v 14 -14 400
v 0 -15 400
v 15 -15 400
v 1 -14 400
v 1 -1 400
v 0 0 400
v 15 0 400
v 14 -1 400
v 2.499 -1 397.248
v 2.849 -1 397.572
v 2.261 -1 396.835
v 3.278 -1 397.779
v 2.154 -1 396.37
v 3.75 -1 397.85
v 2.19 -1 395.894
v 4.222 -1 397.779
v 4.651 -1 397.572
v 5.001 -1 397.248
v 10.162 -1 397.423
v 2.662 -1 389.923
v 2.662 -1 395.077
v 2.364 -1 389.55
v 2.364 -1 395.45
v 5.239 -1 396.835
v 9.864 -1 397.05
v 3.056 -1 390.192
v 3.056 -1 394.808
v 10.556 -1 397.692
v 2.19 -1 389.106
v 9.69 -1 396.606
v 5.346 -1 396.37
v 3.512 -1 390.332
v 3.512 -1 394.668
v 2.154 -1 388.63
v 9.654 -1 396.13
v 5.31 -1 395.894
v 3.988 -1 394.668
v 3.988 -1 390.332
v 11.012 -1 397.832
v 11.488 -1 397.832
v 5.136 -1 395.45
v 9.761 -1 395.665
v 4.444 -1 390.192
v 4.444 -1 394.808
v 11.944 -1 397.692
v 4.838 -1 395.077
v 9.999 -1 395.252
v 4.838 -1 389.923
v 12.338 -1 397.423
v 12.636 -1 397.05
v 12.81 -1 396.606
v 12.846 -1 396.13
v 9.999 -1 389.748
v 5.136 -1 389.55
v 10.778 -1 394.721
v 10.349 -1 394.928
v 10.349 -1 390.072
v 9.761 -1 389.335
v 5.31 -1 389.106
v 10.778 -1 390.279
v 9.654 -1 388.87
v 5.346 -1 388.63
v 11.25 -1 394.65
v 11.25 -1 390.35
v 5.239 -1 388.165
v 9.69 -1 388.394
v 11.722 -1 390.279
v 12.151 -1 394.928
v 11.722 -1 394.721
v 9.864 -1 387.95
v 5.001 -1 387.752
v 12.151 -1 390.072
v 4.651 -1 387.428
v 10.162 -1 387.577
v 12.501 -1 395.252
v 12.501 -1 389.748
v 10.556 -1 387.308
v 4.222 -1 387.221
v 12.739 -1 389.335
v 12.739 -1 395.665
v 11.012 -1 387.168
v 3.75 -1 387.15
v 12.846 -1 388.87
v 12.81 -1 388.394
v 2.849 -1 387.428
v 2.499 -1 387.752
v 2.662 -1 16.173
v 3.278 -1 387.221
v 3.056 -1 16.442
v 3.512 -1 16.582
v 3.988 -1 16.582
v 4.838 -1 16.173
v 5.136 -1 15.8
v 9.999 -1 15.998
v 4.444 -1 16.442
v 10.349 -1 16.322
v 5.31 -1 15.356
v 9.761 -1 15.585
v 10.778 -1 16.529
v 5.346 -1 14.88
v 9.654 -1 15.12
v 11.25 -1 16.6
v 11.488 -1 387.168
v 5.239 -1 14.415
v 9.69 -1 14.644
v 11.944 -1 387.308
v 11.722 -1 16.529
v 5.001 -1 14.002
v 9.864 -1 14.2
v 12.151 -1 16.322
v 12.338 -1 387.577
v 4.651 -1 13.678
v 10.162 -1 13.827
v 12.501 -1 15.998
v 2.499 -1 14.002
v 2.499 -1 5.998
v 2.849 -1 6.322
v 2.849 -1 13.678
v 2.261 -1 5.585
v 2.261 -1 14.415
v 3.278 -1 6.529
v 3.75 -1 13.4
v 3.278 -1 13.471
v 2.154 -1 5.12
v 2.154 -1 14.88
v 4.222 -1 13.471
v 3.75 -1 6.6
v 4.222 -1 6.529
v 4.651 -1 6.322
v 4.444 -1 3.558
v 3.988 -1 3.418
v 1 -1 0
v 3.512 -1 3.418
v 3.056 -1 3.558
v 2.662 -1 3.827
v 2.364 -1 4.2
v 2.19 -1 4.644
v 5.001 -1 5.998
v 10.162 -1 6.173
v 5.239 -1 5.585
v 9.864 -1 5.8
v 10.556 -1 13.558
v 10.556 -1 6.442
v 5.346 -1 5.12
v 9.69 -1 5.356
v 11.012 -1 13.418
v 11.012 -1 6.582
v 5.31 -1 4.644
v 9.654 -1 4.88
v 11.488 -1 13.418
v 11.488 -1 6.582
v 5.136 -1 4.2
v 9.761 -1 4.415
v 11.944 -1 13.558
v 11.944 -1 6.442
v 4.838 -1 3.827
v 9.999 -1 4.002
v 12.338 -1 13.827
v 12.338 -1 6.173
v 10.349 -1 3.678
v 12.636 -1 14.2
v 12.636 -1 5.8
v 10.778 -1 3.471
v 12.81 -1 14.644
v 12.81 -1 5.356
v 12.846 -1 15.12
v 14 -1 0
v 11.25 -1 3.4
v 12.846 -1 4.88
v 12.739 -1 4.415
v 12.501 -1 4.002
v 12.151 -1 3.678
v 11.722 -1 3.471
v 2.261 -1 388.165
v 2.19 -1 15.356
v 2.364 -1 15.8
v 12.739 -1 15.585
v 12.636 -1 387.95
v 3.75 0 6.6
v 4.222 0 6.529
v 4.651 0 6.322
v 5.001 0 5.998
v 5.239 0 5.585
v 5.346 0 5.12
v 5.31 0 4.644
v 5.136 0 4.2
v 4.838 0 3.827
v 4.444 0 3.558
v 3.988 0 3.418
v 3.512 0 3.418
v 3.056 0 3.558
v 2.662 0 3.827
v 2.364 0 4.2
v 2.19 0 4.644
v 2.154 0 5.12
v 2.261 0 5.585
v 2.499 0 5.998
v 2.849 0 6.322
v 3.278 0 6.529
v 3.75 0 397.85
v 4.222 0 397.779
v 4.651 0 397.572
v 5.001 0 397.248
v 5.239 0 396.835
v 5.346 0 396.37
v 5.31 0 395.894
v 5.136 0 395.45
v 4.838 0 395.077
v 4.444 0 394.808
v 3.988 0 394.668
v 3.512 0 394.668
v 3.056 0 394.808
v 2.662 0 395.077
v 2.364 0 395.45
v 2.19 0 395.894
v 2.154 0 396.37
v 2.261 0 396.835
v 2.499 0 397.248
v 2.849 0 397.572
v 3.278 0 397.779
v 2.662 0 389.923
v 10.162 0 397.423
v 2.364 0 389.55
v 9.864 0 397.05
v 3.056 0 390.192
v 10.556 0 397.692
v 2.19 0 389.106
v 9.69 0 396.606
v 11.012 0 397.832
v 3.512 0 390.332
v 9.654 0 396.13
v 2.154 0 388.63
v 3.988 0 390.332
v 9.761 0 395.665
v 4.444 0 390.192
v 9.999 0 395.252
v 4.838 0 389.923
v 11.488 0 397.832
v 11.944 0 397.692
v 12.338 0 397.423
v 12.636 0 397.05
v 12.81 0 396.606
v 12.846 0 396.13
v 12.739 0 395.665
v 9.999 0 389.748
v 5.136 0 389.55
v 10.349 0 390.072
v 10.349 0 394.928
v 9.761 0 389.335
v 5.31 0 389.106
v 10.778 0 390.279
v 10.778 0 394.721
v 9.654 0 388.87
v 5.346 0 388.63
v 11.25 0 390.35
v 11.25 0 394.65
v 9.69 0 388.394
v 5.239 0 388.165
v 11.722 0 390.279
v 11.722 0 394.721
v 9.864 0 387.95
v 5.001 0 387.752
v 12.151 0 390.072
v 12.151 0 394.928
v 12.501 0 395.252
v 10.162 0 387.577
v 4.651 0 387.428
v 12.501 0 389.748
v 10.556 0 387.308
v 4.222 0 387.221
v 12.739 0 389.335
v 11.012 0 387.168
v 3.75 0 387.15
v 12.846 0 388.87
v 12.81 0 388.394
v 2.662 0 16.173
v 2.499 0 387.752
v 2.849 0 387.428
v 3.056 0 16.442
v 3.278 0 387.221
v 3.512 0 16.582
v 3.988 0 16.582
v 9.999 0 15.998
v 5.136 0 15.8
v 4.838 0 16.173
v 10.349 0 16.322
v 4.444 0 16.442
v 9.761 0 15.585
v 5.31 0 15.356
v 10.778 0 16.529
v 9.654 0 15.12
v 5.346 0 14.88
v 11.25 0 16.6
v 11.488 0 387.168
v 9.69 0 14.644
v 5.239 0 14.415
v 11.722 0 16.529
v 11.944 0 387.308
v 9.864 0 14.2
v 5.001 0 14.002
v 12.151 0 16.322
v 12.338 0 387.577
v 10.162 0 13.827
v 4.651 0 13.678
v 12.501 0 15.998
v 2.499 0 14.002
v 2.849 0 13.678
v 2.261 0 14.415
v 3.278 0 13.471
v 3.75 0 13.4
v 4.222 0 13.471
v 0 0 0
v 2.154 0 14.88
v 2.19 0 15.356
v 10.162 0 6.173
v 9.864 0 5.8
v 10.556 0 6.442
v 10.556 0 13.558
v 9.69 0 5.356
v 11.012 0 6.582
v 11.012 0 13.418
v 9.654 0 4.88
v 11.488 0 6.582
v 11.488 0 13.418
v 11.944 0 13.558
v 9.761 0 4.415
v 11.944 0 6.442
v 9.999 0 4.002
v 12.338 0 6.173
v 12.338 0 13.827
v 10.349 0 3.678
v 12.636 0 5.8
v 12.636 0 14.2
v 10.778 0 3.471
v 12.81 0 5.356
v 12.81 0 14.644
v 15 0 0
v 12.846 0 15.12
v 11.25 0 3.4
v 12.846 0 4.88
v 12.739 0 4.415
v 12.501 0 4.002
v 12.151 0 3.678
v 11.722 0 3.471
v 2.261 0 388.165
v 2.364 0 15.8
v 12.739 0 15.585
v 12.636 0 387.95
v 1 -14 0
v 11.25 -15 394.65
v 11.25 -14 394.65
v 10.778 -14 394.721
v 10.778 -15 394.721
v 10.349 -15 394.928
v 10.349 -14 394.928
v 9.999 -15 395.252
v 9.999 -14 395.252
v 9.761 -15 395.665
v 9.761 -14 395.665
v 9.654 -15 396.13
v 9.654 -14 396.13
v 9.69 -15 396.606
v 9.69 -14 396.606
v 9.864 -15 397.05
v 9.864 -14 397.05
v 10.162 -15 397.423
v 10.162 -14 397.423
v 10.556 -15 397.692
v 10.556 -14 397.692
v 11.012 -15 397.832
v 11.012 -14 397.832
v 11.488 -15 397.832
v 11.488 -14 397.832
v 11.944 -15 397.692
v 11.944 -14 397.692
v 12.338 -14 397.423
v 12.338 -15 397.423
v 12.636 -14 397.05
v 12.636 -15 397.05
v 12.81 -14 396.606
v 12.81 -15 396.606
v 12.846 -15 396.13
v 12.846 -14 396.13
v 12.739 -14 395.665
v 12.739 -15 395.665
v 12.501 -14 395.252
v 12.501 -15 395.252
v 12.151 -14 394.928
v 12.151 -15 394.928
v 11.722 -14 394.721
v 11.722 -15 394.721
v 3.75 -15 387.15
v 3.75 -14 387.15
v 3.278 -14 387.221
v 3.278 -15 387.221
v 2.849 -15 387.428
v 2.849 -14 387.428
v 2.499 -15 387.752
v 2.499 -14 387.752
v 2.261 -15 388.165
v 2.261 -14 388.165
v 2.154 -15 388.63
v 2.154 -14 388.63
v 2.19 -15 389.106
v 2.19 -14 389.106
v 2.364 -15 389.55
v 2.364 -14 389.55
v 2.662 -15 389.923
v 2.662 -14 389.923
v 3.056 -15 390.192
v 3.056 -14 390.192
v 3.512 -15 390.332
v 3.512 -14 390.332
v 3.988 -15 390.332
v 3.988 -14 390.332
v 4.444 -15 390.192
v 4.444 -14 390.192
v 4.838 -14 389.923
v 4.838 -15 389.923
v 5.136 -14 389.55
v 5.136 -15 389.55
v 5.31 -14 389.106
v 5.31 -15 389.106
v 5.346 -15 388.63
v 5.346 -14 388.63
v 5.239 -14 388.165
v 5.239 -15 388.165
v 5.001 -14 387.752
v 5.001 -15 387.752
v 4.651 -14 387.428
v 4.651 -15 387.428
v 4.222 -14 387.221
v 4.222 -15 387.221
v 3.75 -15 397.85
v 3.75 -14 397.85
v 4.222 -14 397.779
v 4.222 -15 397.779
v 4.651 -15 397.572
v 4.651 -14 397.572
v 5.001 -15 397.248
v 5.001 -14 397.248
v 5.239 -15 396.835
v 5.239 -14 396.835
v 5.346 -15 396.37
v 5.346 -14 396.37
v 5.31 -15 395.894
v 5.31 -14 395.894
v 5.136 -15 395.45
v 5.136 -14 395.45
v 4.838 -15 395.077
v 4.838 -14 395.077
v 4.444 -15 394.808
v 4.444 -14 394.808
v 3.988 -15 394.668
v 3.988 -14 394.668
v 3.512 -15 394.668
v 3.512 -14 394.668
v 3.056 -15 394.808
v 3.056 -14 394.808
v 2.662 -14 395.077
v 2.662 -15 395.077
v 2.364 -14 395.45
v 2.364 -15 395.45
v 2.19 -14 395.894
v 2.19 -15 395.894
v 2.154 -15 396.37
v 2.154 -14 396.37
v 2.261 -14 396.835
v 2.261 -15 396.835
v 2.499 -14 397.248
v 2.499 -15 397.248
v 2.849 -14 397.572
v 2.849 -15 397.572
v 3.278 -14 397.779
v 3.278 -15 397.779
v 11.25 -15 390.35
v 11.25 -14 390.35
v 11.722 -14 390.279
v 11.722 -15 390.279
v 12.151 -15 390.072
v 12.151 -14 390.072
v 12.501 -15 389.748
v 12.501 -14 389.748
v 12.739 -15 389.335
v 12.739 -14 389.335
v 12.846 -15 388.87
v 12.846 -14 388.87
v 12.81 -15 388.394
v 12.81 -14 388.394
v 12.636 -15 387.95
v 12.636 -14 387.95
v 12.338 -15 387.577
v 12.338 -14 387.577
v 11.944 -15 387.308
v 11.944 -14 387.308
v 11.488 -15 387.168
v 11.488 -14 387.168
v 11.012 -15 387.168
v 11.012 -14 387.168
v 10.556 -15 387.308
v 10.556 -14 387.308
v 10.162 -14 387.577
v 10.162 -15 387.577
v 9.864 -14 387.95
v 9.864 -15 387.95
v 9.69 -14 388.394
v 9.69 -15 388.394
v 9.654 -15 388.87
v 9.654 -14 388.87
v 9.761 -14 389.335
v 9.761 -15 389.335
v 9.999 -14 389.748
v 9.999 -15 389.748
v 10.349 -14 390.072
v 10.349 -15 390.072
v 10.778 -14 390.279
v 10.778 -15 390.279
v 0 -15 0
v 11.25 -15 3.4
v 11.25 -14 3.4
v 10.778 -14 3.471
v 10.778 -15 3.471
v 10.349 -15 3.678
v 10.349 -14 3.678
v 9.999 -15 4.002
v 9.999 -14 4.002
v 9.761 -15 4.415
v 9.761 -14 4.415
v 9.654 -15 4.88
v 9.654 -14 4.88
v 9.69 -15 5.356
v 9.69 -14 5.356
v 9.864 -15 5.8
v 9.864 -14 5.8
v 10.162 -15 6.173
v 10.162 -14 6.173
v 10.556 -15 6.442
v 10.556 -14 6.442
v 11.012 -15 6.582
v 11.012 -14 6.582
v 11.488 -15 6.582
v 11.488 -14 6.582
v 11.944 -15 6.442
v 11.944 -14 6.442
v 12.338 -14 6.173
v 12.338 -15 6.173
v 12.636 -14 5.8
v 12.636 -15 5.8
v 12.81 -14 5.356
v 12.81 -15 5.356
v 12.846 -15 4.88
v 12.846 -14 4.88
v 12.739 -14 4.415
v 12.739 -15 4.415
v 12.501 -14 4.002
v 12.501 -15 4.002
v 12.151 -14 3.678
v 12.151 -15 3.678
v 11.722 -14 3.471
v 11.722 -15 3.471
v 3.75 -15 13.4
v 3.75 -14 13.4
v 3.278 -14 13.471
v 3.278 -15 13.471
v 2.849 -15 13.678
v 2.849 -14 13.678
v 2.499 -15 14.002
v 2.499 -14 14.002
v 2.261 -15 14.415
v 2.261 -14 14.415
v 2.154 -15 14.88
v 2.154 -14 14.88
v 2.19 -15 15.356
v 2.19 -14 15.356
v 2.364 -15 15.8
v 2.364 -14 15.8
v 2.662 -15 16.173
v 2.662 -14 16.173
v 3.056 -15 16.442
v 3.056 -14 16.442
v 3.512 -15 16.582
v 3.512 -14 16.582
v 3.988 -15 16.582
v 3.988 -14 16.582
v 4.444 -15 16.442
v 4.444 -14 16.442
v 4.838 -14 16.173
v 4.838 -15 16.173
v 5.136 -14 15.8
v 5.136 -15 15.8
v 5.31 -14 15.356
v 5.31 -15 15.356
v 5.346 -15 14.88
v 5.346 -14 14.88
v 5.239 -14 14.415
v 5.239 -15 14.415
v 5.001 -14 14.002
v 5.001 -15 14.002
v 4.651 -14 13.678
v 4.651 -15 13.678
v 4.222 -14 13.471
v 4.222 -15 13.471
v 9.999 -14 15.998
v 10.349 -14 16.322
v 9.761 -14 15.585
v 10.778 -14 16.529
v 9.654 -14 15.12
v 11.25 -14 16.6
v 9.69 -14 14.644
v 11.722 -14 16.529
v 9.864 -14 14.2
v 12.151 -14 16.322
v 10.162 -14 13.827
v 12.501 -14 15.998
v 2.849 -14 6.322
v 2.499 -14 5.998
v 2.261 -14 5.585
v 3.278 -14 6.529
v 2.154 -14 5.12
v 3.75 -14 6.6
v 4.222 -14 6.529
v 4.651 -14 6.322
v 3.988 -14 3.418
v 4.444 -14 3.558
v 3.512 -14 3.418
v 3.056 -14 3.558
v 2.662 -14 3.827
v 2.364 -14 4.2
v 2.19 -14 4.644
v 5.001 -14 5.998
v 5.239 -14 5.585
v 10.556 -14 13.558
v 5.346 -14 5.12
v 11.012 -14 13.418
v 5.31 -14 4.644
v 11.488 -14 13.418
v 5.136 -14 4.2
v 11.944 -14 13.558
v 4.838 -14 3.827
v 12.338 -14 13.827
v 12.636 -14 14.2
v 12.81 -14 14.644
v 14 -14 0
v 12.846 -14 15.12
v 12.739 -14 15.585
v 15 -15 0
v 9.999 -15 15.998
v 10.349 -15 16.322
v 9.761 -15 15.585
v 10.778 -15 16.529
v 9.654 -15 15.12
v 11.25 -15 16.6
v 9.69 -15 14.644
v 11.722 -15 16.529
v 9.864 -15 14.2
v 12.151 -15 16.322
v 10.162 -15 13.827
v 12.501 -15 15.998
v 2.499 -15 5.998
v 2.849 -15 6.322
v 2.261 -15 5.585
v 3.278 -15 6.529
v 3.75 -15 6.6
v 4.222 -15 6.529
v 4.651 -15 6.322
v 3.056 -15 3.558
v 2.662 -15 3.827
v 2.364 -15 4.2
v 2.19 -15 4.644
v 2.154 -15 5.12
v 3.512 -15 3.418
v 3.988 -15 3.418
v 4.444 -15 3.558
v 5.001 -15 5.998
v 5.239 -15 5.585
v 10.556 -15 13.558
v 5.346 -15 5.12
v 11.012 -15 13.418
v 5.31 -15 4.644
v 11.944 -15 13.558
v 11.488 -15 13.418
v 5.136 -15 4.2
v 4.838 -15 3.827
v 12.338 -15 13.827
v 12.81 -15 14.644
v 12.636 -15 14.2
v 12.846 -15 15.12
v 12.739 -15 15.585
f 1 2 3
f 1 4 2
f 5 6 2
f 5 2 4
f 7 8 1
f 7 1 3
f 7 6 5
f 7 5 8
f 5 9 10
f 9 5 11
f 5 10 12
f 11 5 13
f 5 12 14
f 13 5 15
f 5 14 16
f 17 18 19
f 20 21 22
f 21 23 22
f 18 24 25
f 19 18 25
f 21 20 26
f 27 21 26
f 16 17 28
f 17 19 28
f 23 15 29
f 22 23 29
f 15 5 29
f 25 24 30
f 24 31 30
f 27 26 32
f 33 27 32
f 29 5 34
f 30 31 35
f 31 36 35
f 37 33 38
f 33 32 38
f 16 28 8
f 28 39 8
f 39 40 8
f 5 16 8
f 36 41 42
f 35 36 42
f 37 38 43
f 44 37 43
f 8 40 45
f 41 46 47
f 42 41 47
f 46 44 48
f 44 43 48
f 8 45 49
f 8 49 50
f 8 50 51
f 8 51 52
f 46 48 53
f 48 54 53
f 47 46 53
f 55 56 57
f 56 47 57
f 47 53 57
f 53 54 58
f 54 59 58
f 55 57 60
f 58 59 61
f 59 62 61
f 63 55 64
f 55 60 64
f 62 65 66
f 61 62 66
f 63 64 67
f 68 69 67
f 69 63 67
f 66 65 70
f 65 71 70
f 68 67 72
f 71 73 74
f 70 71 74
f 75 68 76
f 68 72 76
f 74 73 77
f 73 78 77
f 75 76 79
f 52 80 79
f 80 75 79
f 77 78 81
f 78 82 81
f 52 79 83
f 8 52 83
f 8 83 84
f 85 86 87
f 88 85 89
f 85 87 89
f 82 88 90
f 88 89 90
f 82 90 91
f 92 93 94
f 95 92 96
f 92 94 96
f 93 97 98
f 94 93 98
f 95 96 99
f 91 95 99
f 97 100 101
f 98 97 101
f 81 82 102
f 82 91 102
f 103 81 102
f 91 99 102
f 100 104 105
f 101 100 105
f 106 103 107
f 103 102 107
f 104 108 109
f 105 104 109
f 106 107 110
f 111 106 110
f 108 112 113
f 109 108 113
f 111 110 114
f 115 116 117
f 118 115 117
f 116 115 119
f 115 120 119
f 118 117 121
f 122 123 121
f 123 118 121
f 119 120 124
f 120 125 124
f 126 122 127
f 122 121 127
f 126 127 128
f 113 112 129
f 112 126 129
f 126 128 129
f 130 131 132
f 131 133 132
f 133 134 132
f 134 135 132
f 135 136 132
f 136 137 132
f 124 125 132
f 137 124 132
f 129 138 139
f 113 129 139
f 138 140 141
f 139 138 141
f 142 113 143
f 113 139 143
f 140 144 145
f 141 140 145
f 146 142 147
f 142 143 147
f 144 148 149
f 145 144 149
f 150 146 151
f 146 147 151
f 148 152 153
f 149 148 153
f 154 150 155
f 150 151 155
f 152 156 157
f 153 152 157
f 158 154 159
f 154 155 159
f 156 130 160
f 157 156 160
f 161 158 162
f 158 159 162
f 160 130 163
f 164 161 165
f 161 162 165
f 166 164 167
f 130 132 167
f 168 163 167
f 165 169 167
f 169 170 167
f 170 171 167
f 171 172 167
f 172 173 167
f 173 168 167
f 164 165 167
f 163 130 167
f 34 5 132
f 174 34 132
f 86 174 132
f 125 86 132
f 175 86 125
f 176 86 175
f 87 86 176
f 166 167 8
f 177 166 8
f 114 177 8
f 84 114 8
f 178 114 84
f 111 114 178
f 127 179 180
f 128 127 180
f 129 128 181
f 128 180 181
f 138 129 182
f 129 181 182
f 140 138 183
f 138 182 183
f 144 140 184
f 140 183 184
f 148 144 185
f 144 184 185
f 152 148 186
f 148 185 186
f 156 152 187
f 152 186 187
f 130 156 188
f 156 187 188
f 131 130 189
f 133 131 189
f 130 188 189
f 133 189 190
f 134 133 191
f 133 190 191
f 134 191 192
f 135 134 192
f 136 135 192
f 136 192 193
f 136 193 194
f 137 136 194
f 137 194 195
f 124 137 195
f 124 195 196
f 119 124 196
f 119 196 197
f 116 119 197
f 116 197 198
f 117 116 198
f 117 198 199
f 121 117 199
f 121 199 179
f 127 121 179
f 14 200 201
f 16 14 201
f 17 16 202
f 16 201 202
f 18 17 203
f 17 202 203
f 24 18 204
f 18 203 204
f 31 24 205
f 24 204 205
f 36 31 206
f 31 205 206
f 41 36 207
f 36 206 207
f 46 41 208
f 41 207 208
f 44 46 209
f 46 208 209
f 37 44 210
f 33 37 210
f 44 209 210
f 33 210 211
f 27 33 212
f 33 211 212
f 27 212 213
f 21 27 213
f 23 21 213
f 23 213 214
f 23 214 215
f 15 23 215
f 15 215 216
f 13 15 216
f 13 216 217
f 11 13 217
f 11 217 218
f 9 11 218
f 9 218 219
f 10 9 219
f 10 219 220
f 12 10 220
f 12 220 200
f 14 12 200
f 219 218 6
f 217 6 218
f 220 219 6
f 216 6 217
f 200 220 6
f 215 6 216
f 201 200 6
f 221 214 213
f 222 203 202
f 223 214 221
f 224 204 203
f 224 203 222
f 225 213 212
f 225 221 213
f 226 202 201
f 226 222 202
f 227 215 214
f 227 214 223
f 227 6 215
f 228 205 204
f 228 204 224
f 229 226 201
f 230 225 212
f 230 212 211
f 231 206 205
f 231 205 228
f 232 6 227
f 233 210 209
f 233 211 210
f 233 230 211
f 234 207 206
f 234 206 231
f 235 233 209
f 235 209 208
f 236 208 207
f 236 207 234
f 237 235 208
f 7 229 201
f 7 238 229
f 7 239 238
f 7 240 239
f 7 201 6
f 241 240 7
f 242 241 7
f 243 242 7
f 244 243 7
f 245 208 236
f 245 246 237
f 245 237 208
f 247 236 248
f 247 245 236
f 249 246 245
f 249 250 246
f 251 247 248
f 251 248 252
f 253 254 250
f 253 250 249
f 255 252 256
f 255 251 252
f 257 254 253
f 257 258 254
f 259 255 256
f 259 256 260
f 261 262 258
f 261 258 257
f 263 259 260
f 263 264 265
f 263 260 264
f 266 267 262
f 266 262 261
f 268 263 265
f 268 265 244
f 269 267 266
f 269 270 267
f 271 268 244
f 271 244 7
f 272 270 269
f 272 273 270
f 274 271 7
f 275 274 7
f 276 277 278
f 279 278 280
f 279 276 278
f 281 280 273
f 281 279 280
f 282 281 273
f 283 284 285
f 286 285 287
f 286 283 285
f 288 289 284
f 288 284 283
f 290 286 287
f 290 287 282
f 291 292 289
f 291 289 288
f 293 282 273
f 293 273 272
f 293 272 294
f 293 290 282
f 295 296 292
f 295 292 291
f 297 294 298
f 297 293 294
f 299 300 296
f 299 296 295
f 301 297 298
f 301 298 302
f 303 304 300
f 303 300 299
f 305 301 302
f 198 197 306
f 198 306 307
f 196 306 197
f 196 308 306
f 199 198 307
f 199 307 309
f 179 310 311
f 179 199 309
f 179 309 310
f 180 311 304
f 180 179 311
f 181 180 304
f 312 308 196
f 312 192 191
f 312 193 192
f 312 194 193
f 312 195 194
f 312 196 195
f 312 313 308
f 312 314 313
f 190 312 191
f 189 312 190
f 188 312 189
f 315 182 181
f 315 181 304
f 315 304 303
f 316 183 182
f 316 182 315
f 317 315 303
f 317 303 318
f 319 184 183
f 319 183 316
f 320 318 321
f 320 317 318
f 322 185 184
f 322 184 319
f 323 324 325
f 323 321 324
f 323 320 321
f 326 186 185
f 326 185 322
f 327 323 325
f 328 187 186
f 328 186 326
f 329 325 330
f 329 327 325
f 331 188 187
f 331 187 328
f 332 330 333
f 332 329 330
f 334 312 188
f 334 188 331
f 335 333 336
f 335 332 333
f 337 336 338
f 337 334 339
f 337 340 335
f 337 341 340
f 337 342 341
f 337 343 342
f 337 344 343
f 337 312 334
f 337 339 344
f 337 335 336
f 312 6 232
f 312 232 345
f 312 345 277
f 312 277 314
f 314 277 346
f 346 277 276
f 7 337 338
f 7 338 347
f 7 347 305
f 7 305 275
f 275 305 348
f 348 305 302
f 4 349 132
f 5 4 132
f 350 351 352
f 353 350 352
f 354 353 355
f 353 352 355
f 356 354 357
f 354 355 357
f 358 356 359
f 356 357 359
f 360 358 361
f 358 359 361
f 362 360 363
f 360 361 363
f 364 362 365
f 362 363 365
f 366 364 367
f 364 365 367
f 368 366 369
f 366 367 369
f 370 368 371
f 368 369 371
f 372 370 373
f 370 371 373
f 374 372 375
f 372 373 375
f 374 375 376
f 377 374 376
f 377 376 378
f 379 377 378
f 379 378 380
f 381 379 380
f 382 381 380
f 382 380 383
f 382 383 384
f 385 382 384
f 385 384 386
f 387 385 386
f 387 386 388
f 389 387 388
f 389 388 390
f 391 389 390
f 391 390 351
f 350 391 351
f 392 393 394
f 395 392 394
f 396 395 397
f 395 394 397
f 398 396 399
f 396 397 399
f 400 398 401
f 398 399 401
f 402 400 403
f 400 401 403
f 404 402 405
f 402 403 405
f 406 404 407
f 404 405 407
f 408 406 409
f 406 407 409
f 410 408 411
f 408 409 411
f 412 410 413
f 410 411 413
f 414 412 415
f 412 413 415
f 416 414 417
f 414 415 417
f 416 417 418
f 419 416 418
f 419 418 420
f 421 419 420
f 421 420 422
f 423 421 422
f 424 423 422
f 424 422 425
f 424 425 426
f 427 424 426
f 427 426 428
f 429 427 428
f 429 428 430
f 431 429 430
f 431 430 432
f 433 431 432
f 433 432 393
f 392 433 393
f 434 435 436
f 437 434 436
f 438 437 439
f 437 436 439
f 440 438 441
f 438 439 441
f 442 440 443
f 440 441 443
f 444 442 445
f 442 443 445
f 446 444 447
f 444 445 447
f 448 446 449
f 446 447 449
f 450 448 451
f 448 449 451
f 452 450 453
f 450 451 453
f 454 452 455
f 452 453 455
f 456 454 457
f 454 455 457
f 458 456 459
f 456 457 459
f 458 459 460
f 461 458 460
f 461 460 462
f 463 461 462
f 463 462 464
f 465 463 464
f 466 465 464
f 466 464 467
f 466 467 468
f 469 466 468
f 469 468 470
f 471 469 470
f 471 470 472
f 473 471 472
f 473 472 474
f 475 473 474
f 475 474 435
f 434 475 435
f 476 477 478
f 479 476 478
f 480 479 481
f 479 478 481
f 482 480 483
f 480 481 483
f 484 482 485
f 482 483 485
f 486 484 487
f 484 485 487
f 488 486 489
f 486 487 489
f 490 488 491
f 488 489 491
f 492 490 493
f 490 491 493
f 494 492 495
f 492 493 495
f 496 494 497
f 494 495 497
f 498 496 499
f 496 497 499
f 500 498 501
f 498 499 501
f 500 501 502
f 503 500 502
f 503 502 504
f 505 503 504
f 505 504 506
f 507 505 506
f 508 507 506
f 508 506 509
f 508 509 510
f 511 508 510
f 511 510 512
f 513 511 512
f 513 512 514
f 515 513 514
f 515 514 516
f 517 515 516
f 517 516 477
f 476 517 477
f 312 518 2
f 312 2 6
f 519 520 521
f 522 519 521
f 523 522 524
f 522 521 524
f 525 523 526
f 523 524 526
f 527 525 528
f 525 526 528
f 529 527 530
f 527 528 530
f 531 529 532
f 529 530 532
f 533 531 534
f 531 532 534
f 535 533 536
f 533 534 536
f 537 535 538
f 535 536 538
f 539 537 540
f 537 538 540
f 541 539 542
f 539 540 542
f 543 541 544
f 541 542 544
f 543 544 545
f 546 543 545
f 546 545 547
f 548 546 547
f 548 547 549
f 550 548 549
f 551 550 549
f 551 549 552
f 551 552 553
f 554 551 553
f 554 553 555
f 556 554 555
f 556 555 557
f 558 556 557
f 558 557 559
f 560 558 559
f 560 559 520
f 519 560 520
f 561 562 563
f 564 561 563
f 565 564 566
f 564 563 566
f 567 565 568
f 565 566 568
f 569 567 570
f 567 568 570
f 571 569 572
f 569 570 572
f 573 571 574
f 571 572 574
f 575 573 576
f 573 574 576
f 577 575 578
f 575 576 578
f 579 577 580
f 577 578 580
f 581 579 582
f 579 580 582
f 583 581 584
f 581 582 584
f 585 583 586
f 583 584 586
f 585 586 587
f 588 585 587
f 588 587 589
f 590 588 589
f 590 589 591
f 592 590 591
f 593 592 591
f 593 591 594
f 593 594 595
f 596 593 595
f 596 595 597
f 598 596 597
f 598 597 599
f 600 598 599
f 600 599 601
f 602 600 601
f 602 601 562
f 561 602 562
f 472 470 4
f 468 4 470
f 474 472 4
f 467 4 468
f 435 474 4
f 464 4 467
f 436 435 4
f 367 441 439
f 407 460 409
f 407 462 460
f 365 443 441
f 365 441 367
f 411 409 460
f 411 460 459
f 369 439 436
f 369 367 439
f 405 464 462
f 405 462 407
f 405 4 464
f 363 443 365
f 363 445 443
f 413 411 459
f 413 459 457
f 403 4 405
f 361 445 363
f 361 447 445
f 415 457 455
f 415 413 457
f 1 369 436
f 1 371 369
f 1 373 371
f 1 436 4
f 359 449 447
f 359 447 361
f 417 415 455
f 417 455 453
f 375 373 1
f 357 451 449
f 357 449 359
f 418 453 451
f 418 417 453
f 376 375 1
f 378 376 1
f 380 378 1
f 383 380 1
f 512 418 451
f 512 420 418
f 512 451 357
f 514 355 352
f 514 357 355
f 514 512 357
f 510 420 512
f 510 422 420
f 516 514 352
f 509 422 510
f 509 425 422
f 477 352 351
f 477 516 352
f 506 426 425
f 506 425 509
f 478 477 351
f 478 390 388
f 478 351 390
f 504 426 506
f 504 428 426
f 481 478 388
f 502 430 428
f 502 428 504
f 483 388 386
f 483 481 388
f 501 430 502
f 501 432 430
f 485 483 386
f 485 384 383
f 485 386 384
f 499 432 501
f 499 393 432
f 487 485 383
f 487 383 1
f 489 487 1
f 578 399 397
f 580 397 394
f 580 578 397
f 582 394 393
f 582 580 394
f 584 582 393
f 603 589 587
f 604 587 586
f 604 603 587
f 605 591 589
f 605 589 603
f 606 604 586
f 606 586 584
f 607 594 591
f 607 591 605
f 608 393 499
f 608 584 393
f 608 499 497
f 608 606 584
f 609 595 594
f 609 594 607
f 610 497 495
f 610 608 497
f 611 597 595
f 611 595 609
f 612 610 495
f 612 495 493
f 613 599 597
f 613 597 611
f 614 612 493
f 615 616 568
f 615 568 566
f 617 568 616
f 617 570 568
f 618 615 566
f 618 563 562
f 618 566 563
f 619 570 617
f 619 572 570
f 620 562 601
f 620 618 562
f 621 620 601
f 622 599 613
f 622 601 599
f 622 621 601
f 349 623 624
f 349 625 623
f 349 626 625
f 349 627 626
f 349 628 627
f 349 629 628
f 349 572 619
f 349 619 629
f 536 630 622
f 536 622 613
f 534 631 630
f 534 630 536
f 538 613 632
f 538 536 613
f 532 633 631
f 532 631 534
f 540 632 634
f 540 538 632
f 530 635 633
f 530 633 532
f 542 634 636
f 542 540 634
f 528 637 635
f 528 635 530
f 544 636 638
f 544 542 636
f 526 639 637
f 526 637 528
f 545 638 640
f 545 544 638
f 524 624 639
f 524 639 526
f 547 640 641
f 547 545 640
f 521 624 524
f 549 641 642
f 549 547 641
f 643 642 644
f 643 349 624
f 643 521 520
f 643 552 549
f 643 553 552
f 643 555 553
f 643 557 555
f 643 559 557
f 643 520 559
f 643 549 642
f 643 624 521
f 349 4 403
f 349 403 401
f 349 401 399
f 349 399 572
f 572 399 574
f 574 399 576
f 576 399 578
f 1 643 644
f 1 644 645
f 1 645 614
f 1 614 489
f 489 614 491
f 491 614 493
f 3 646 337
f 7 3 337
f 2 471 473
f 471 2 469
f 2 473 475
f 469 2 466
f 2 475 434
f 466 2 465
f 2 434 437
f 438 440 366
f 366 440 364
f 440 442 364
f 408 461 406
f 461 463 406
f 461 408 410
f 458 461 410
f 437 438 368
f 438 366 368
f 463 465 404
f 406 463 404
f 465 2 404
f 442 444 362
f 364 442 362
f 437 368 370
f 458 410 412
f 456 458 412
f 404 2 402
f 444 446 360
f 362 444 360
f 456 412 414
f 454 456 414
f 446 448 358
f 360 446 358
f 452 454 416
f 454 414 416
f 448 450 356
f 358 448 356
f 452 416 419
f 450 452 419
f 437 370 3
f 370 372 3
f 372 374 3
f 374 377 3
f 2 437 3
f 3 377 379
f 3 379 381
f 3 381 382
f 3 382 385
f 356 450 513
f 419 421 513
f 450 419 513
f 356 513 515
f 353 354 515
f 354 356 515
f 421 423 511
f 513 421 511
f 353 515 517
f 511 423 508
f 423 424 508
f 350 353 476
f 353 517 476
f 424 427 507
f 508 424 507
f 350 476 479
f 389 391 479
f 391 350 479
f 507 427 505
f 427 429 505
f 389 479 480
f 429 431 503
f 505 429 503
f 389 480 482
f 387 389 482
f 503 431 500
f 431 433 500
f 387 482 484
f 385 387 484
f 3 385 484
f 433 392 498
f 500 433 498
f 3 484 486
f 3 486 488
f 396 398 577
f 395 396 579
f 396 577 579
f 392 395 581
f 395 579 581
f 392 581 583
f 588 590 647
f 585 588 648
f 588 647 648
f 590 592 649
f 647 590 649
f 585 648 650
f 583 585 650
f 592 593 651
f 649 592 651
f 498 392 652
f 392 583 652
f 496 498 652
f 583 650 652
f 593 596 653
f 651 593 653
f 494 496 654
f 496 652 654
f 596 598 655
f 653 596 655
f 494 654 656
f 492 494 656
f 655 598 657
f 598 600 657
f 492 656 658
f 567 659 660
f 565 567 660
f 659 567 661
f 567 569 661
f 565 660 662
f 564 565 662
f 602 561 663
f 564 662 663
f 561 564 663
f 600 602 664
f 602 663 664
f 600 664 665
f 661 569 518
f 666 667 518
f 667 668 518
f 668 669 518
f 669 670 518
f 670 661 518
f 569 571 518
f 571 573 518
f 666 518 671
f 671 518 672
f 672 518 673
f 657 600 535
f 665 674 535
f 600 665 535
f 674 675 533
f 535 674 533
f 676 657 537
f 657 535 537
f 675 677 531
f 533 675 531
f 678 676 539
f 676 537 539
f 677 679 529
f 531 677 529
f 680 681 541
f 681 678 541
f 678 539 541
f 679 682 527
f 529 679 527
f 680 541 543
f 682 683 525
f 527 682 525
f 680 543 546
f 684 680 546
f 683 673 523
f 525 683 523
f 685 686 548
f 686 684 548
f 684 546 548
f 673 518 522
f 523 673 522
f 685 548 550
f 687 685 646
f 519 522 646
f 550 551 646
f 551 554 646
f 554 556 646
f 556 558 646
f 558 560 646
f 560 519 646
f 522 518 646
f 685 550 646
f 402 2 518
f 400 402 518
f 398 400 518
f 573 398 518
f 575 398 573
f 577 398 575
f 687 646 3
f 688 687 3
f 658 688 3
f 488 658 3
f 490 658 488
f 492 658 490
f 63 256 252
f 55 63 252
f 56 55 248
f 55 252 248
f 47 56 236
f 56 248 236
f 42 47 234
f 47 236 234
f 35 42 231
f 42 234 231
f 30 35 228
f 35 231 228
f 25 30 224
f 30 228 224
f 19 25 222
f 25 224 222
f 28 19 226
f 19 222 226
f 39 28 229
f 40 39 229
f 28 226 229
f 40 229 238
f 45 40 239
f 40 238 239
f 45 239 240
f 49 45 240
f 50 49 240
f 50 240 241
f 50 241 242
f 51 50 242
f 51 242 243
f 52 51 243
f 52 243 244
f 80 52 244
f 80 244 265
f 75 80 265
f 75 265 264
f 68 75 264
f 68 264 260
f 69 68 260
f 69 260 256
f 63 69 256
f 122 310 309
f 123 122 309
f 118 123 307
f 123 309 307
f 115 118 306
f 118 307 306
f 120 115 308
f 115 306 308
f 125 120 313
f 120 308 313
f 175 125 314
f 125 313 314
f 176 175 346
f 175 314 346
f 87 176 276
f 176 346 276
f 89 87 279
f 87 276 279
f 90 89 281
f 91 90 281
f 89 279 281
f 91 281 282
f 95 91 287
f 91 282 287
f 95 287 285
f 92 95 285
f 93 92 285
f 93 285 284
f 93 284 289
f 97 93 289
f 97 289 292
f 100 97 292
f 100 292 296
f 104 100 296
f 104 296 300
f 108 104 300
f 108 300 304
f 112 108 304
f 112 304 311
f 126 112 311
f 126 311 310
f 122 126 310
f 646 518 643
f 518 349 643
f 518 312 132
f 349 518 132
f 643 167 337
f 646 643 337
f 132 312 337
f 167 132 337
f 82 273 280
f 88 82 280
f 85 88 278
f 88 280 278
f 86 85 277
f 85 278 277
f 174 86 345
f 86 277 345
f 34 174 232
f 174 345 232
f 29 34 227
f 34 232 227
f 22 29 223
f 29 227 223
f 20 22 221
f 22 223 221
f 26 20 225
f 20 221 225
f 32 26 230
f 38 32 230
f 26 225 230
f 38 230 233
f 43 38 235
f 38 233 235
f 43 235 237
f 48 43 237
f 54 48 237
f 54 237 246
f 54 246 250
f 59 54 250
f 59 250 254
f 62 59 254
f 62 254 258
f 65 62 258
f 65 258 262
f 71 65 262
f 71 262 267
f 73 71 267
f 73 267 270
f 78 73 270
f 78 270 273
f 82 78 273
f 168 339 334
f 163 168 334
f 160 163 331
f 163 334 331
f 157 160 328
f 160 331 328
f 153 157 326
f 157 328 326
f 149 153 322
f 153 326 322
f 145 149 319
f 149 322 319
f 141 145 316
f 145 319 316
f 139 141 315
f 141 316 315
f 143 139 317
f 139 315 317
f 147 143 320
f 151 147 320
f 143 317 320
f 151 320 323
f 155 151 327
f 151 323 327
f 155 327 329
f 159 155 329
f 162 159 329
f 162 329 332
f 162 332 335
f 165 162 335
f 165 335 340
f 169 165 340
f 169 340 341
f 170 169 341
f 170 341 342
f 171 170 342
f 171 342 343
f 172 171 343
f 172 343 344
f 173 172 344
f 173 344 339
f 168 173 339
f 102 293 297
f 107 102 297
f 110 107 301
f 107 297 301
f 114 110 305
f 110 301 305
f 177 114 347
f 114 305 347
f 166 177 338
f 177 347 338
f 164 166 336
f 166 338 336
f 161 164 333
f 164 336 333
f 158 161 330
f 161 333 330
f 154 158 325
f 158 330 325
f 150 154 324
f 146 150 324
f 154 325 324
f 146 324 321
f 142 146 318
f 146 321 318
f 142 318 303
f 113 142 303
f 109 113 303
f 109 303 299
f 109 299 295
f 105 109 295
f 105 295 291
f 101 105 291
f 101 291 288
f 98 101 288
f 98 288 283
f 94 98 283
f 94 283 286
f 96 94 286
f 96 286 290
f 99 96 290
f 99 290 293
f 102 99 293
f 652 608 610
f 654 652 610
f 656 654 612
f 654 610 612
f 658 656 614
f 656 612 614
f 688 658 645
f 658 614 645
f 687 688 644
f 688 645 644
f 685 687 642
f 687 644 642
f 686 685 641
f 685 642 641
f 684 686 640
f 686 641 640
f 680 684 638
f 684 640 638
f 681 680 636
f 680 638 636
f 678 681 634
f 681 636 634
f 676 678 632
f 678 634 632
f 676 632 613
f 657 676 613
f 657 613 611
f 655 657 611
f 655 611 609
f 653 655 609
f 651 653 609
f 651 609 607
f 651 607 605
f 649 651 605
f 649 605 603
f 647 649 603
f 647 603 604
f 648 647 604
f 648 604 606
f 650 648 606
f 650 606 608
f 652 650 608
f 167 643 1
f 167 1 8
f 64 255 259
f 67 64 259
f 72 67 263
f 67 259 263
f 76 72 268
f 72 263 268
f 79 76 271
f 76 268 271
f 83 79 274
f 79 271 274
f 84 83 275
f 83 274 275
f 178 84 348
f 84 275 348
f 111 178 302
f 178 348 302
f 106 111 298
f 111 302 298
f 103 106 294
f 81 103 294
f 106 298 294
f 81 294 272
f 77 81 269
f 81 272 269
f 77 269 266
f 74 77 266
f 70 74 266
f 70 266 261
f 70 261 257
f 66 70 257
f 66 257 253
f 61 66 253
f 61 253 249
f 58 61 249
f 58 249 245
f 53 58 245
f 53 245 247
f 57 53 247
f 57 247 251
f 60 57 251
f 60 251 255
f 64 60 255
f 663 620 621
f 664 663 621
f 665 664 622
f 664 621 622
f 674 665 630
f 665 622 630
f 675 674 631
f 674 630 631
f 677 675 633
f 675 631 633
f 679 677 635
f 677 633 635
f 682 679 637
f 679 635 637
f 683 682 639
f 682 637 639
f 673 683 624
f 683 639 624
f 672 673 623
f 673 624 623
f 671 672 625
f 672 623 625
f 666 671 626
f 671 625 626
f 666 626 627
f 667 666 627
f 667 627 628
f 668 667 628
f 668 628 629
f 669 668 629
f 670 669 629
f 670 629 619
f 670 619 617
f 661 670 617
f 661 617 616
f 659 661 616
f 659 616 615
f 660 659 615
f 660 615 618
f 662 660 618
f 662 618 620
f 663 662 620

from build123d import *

# Parameters (mm, degrees)
SKETCH_1_W          = 15
SKETCH_1_H          = 15
SKETCH_1_W_2        = 13
SKETCH_1_H_2        = 13
EXTRUDE_1_DEPTH     = 400
SKETCH_2_R          = 1.6
CUT_EXTRUDE_1_DEPTH = 401.562105047


with BuildPart() as part:
    # 草图1 → 拉伸-薄壁1 (new body)
    with BuildSketch(Plane.XY):
        with Locations((7.5, -7.5)):
            Rectangle(SKETCH_1_W, SKETCH_1_H)
        with Locations((7.5, -7.5)):
            Rectangle(SKETCH_1_W_2, SKETCH_1_H_2, mode=Mode.SUBTRACT)
    extrude(amount=EXTRUDE_1_DEPTH)

    # 草图2 → 切除-拉伸1 (cut, through all)
    with BuildSketch(Plane(origin=(0, 0, 0), x_dir=(1, 0, 0), z_dir=(0, 1, 0))):
        with Locations(Location((3.75, -5, 0), (0, 0, 270))):
            Circle(SKETCH_2_R)
        with Locations(Location((11.25, -5, 0), (0, 0, 90))):
            Circle(SKETCH_2_R)
        with Locations(Location((11.25, -15, 0), (0, 0, 270))):
            Circle(SKETCH_2_R)
        with Locations(Location((3.75, -15, 0), (0, 0, 90))):
            Circle(SKETCH_2_R)
        with Locations(Location((3.75, -396.25, 0), (0, 0, 270))):
            Circle(SKETCH_2_R)
        with Locations(Location((11.25, -396.25, 0), (0, 0, 90))):
            Circle(SKETCH_2_R)
        with Locations(Location((11.25, -388.75, 0), (0, 0, 270))):
            Circle(SKETCH_2_R)
        with Locations(Location((3.75, -388.75, 0), (0, 0, 90))):
            Circle(SKETCH_2_R)
    extrude(amount=-CUT_EXTRUDE_1_DEPTH, mode=Mode.SUBTRACT)


solid = part.part
